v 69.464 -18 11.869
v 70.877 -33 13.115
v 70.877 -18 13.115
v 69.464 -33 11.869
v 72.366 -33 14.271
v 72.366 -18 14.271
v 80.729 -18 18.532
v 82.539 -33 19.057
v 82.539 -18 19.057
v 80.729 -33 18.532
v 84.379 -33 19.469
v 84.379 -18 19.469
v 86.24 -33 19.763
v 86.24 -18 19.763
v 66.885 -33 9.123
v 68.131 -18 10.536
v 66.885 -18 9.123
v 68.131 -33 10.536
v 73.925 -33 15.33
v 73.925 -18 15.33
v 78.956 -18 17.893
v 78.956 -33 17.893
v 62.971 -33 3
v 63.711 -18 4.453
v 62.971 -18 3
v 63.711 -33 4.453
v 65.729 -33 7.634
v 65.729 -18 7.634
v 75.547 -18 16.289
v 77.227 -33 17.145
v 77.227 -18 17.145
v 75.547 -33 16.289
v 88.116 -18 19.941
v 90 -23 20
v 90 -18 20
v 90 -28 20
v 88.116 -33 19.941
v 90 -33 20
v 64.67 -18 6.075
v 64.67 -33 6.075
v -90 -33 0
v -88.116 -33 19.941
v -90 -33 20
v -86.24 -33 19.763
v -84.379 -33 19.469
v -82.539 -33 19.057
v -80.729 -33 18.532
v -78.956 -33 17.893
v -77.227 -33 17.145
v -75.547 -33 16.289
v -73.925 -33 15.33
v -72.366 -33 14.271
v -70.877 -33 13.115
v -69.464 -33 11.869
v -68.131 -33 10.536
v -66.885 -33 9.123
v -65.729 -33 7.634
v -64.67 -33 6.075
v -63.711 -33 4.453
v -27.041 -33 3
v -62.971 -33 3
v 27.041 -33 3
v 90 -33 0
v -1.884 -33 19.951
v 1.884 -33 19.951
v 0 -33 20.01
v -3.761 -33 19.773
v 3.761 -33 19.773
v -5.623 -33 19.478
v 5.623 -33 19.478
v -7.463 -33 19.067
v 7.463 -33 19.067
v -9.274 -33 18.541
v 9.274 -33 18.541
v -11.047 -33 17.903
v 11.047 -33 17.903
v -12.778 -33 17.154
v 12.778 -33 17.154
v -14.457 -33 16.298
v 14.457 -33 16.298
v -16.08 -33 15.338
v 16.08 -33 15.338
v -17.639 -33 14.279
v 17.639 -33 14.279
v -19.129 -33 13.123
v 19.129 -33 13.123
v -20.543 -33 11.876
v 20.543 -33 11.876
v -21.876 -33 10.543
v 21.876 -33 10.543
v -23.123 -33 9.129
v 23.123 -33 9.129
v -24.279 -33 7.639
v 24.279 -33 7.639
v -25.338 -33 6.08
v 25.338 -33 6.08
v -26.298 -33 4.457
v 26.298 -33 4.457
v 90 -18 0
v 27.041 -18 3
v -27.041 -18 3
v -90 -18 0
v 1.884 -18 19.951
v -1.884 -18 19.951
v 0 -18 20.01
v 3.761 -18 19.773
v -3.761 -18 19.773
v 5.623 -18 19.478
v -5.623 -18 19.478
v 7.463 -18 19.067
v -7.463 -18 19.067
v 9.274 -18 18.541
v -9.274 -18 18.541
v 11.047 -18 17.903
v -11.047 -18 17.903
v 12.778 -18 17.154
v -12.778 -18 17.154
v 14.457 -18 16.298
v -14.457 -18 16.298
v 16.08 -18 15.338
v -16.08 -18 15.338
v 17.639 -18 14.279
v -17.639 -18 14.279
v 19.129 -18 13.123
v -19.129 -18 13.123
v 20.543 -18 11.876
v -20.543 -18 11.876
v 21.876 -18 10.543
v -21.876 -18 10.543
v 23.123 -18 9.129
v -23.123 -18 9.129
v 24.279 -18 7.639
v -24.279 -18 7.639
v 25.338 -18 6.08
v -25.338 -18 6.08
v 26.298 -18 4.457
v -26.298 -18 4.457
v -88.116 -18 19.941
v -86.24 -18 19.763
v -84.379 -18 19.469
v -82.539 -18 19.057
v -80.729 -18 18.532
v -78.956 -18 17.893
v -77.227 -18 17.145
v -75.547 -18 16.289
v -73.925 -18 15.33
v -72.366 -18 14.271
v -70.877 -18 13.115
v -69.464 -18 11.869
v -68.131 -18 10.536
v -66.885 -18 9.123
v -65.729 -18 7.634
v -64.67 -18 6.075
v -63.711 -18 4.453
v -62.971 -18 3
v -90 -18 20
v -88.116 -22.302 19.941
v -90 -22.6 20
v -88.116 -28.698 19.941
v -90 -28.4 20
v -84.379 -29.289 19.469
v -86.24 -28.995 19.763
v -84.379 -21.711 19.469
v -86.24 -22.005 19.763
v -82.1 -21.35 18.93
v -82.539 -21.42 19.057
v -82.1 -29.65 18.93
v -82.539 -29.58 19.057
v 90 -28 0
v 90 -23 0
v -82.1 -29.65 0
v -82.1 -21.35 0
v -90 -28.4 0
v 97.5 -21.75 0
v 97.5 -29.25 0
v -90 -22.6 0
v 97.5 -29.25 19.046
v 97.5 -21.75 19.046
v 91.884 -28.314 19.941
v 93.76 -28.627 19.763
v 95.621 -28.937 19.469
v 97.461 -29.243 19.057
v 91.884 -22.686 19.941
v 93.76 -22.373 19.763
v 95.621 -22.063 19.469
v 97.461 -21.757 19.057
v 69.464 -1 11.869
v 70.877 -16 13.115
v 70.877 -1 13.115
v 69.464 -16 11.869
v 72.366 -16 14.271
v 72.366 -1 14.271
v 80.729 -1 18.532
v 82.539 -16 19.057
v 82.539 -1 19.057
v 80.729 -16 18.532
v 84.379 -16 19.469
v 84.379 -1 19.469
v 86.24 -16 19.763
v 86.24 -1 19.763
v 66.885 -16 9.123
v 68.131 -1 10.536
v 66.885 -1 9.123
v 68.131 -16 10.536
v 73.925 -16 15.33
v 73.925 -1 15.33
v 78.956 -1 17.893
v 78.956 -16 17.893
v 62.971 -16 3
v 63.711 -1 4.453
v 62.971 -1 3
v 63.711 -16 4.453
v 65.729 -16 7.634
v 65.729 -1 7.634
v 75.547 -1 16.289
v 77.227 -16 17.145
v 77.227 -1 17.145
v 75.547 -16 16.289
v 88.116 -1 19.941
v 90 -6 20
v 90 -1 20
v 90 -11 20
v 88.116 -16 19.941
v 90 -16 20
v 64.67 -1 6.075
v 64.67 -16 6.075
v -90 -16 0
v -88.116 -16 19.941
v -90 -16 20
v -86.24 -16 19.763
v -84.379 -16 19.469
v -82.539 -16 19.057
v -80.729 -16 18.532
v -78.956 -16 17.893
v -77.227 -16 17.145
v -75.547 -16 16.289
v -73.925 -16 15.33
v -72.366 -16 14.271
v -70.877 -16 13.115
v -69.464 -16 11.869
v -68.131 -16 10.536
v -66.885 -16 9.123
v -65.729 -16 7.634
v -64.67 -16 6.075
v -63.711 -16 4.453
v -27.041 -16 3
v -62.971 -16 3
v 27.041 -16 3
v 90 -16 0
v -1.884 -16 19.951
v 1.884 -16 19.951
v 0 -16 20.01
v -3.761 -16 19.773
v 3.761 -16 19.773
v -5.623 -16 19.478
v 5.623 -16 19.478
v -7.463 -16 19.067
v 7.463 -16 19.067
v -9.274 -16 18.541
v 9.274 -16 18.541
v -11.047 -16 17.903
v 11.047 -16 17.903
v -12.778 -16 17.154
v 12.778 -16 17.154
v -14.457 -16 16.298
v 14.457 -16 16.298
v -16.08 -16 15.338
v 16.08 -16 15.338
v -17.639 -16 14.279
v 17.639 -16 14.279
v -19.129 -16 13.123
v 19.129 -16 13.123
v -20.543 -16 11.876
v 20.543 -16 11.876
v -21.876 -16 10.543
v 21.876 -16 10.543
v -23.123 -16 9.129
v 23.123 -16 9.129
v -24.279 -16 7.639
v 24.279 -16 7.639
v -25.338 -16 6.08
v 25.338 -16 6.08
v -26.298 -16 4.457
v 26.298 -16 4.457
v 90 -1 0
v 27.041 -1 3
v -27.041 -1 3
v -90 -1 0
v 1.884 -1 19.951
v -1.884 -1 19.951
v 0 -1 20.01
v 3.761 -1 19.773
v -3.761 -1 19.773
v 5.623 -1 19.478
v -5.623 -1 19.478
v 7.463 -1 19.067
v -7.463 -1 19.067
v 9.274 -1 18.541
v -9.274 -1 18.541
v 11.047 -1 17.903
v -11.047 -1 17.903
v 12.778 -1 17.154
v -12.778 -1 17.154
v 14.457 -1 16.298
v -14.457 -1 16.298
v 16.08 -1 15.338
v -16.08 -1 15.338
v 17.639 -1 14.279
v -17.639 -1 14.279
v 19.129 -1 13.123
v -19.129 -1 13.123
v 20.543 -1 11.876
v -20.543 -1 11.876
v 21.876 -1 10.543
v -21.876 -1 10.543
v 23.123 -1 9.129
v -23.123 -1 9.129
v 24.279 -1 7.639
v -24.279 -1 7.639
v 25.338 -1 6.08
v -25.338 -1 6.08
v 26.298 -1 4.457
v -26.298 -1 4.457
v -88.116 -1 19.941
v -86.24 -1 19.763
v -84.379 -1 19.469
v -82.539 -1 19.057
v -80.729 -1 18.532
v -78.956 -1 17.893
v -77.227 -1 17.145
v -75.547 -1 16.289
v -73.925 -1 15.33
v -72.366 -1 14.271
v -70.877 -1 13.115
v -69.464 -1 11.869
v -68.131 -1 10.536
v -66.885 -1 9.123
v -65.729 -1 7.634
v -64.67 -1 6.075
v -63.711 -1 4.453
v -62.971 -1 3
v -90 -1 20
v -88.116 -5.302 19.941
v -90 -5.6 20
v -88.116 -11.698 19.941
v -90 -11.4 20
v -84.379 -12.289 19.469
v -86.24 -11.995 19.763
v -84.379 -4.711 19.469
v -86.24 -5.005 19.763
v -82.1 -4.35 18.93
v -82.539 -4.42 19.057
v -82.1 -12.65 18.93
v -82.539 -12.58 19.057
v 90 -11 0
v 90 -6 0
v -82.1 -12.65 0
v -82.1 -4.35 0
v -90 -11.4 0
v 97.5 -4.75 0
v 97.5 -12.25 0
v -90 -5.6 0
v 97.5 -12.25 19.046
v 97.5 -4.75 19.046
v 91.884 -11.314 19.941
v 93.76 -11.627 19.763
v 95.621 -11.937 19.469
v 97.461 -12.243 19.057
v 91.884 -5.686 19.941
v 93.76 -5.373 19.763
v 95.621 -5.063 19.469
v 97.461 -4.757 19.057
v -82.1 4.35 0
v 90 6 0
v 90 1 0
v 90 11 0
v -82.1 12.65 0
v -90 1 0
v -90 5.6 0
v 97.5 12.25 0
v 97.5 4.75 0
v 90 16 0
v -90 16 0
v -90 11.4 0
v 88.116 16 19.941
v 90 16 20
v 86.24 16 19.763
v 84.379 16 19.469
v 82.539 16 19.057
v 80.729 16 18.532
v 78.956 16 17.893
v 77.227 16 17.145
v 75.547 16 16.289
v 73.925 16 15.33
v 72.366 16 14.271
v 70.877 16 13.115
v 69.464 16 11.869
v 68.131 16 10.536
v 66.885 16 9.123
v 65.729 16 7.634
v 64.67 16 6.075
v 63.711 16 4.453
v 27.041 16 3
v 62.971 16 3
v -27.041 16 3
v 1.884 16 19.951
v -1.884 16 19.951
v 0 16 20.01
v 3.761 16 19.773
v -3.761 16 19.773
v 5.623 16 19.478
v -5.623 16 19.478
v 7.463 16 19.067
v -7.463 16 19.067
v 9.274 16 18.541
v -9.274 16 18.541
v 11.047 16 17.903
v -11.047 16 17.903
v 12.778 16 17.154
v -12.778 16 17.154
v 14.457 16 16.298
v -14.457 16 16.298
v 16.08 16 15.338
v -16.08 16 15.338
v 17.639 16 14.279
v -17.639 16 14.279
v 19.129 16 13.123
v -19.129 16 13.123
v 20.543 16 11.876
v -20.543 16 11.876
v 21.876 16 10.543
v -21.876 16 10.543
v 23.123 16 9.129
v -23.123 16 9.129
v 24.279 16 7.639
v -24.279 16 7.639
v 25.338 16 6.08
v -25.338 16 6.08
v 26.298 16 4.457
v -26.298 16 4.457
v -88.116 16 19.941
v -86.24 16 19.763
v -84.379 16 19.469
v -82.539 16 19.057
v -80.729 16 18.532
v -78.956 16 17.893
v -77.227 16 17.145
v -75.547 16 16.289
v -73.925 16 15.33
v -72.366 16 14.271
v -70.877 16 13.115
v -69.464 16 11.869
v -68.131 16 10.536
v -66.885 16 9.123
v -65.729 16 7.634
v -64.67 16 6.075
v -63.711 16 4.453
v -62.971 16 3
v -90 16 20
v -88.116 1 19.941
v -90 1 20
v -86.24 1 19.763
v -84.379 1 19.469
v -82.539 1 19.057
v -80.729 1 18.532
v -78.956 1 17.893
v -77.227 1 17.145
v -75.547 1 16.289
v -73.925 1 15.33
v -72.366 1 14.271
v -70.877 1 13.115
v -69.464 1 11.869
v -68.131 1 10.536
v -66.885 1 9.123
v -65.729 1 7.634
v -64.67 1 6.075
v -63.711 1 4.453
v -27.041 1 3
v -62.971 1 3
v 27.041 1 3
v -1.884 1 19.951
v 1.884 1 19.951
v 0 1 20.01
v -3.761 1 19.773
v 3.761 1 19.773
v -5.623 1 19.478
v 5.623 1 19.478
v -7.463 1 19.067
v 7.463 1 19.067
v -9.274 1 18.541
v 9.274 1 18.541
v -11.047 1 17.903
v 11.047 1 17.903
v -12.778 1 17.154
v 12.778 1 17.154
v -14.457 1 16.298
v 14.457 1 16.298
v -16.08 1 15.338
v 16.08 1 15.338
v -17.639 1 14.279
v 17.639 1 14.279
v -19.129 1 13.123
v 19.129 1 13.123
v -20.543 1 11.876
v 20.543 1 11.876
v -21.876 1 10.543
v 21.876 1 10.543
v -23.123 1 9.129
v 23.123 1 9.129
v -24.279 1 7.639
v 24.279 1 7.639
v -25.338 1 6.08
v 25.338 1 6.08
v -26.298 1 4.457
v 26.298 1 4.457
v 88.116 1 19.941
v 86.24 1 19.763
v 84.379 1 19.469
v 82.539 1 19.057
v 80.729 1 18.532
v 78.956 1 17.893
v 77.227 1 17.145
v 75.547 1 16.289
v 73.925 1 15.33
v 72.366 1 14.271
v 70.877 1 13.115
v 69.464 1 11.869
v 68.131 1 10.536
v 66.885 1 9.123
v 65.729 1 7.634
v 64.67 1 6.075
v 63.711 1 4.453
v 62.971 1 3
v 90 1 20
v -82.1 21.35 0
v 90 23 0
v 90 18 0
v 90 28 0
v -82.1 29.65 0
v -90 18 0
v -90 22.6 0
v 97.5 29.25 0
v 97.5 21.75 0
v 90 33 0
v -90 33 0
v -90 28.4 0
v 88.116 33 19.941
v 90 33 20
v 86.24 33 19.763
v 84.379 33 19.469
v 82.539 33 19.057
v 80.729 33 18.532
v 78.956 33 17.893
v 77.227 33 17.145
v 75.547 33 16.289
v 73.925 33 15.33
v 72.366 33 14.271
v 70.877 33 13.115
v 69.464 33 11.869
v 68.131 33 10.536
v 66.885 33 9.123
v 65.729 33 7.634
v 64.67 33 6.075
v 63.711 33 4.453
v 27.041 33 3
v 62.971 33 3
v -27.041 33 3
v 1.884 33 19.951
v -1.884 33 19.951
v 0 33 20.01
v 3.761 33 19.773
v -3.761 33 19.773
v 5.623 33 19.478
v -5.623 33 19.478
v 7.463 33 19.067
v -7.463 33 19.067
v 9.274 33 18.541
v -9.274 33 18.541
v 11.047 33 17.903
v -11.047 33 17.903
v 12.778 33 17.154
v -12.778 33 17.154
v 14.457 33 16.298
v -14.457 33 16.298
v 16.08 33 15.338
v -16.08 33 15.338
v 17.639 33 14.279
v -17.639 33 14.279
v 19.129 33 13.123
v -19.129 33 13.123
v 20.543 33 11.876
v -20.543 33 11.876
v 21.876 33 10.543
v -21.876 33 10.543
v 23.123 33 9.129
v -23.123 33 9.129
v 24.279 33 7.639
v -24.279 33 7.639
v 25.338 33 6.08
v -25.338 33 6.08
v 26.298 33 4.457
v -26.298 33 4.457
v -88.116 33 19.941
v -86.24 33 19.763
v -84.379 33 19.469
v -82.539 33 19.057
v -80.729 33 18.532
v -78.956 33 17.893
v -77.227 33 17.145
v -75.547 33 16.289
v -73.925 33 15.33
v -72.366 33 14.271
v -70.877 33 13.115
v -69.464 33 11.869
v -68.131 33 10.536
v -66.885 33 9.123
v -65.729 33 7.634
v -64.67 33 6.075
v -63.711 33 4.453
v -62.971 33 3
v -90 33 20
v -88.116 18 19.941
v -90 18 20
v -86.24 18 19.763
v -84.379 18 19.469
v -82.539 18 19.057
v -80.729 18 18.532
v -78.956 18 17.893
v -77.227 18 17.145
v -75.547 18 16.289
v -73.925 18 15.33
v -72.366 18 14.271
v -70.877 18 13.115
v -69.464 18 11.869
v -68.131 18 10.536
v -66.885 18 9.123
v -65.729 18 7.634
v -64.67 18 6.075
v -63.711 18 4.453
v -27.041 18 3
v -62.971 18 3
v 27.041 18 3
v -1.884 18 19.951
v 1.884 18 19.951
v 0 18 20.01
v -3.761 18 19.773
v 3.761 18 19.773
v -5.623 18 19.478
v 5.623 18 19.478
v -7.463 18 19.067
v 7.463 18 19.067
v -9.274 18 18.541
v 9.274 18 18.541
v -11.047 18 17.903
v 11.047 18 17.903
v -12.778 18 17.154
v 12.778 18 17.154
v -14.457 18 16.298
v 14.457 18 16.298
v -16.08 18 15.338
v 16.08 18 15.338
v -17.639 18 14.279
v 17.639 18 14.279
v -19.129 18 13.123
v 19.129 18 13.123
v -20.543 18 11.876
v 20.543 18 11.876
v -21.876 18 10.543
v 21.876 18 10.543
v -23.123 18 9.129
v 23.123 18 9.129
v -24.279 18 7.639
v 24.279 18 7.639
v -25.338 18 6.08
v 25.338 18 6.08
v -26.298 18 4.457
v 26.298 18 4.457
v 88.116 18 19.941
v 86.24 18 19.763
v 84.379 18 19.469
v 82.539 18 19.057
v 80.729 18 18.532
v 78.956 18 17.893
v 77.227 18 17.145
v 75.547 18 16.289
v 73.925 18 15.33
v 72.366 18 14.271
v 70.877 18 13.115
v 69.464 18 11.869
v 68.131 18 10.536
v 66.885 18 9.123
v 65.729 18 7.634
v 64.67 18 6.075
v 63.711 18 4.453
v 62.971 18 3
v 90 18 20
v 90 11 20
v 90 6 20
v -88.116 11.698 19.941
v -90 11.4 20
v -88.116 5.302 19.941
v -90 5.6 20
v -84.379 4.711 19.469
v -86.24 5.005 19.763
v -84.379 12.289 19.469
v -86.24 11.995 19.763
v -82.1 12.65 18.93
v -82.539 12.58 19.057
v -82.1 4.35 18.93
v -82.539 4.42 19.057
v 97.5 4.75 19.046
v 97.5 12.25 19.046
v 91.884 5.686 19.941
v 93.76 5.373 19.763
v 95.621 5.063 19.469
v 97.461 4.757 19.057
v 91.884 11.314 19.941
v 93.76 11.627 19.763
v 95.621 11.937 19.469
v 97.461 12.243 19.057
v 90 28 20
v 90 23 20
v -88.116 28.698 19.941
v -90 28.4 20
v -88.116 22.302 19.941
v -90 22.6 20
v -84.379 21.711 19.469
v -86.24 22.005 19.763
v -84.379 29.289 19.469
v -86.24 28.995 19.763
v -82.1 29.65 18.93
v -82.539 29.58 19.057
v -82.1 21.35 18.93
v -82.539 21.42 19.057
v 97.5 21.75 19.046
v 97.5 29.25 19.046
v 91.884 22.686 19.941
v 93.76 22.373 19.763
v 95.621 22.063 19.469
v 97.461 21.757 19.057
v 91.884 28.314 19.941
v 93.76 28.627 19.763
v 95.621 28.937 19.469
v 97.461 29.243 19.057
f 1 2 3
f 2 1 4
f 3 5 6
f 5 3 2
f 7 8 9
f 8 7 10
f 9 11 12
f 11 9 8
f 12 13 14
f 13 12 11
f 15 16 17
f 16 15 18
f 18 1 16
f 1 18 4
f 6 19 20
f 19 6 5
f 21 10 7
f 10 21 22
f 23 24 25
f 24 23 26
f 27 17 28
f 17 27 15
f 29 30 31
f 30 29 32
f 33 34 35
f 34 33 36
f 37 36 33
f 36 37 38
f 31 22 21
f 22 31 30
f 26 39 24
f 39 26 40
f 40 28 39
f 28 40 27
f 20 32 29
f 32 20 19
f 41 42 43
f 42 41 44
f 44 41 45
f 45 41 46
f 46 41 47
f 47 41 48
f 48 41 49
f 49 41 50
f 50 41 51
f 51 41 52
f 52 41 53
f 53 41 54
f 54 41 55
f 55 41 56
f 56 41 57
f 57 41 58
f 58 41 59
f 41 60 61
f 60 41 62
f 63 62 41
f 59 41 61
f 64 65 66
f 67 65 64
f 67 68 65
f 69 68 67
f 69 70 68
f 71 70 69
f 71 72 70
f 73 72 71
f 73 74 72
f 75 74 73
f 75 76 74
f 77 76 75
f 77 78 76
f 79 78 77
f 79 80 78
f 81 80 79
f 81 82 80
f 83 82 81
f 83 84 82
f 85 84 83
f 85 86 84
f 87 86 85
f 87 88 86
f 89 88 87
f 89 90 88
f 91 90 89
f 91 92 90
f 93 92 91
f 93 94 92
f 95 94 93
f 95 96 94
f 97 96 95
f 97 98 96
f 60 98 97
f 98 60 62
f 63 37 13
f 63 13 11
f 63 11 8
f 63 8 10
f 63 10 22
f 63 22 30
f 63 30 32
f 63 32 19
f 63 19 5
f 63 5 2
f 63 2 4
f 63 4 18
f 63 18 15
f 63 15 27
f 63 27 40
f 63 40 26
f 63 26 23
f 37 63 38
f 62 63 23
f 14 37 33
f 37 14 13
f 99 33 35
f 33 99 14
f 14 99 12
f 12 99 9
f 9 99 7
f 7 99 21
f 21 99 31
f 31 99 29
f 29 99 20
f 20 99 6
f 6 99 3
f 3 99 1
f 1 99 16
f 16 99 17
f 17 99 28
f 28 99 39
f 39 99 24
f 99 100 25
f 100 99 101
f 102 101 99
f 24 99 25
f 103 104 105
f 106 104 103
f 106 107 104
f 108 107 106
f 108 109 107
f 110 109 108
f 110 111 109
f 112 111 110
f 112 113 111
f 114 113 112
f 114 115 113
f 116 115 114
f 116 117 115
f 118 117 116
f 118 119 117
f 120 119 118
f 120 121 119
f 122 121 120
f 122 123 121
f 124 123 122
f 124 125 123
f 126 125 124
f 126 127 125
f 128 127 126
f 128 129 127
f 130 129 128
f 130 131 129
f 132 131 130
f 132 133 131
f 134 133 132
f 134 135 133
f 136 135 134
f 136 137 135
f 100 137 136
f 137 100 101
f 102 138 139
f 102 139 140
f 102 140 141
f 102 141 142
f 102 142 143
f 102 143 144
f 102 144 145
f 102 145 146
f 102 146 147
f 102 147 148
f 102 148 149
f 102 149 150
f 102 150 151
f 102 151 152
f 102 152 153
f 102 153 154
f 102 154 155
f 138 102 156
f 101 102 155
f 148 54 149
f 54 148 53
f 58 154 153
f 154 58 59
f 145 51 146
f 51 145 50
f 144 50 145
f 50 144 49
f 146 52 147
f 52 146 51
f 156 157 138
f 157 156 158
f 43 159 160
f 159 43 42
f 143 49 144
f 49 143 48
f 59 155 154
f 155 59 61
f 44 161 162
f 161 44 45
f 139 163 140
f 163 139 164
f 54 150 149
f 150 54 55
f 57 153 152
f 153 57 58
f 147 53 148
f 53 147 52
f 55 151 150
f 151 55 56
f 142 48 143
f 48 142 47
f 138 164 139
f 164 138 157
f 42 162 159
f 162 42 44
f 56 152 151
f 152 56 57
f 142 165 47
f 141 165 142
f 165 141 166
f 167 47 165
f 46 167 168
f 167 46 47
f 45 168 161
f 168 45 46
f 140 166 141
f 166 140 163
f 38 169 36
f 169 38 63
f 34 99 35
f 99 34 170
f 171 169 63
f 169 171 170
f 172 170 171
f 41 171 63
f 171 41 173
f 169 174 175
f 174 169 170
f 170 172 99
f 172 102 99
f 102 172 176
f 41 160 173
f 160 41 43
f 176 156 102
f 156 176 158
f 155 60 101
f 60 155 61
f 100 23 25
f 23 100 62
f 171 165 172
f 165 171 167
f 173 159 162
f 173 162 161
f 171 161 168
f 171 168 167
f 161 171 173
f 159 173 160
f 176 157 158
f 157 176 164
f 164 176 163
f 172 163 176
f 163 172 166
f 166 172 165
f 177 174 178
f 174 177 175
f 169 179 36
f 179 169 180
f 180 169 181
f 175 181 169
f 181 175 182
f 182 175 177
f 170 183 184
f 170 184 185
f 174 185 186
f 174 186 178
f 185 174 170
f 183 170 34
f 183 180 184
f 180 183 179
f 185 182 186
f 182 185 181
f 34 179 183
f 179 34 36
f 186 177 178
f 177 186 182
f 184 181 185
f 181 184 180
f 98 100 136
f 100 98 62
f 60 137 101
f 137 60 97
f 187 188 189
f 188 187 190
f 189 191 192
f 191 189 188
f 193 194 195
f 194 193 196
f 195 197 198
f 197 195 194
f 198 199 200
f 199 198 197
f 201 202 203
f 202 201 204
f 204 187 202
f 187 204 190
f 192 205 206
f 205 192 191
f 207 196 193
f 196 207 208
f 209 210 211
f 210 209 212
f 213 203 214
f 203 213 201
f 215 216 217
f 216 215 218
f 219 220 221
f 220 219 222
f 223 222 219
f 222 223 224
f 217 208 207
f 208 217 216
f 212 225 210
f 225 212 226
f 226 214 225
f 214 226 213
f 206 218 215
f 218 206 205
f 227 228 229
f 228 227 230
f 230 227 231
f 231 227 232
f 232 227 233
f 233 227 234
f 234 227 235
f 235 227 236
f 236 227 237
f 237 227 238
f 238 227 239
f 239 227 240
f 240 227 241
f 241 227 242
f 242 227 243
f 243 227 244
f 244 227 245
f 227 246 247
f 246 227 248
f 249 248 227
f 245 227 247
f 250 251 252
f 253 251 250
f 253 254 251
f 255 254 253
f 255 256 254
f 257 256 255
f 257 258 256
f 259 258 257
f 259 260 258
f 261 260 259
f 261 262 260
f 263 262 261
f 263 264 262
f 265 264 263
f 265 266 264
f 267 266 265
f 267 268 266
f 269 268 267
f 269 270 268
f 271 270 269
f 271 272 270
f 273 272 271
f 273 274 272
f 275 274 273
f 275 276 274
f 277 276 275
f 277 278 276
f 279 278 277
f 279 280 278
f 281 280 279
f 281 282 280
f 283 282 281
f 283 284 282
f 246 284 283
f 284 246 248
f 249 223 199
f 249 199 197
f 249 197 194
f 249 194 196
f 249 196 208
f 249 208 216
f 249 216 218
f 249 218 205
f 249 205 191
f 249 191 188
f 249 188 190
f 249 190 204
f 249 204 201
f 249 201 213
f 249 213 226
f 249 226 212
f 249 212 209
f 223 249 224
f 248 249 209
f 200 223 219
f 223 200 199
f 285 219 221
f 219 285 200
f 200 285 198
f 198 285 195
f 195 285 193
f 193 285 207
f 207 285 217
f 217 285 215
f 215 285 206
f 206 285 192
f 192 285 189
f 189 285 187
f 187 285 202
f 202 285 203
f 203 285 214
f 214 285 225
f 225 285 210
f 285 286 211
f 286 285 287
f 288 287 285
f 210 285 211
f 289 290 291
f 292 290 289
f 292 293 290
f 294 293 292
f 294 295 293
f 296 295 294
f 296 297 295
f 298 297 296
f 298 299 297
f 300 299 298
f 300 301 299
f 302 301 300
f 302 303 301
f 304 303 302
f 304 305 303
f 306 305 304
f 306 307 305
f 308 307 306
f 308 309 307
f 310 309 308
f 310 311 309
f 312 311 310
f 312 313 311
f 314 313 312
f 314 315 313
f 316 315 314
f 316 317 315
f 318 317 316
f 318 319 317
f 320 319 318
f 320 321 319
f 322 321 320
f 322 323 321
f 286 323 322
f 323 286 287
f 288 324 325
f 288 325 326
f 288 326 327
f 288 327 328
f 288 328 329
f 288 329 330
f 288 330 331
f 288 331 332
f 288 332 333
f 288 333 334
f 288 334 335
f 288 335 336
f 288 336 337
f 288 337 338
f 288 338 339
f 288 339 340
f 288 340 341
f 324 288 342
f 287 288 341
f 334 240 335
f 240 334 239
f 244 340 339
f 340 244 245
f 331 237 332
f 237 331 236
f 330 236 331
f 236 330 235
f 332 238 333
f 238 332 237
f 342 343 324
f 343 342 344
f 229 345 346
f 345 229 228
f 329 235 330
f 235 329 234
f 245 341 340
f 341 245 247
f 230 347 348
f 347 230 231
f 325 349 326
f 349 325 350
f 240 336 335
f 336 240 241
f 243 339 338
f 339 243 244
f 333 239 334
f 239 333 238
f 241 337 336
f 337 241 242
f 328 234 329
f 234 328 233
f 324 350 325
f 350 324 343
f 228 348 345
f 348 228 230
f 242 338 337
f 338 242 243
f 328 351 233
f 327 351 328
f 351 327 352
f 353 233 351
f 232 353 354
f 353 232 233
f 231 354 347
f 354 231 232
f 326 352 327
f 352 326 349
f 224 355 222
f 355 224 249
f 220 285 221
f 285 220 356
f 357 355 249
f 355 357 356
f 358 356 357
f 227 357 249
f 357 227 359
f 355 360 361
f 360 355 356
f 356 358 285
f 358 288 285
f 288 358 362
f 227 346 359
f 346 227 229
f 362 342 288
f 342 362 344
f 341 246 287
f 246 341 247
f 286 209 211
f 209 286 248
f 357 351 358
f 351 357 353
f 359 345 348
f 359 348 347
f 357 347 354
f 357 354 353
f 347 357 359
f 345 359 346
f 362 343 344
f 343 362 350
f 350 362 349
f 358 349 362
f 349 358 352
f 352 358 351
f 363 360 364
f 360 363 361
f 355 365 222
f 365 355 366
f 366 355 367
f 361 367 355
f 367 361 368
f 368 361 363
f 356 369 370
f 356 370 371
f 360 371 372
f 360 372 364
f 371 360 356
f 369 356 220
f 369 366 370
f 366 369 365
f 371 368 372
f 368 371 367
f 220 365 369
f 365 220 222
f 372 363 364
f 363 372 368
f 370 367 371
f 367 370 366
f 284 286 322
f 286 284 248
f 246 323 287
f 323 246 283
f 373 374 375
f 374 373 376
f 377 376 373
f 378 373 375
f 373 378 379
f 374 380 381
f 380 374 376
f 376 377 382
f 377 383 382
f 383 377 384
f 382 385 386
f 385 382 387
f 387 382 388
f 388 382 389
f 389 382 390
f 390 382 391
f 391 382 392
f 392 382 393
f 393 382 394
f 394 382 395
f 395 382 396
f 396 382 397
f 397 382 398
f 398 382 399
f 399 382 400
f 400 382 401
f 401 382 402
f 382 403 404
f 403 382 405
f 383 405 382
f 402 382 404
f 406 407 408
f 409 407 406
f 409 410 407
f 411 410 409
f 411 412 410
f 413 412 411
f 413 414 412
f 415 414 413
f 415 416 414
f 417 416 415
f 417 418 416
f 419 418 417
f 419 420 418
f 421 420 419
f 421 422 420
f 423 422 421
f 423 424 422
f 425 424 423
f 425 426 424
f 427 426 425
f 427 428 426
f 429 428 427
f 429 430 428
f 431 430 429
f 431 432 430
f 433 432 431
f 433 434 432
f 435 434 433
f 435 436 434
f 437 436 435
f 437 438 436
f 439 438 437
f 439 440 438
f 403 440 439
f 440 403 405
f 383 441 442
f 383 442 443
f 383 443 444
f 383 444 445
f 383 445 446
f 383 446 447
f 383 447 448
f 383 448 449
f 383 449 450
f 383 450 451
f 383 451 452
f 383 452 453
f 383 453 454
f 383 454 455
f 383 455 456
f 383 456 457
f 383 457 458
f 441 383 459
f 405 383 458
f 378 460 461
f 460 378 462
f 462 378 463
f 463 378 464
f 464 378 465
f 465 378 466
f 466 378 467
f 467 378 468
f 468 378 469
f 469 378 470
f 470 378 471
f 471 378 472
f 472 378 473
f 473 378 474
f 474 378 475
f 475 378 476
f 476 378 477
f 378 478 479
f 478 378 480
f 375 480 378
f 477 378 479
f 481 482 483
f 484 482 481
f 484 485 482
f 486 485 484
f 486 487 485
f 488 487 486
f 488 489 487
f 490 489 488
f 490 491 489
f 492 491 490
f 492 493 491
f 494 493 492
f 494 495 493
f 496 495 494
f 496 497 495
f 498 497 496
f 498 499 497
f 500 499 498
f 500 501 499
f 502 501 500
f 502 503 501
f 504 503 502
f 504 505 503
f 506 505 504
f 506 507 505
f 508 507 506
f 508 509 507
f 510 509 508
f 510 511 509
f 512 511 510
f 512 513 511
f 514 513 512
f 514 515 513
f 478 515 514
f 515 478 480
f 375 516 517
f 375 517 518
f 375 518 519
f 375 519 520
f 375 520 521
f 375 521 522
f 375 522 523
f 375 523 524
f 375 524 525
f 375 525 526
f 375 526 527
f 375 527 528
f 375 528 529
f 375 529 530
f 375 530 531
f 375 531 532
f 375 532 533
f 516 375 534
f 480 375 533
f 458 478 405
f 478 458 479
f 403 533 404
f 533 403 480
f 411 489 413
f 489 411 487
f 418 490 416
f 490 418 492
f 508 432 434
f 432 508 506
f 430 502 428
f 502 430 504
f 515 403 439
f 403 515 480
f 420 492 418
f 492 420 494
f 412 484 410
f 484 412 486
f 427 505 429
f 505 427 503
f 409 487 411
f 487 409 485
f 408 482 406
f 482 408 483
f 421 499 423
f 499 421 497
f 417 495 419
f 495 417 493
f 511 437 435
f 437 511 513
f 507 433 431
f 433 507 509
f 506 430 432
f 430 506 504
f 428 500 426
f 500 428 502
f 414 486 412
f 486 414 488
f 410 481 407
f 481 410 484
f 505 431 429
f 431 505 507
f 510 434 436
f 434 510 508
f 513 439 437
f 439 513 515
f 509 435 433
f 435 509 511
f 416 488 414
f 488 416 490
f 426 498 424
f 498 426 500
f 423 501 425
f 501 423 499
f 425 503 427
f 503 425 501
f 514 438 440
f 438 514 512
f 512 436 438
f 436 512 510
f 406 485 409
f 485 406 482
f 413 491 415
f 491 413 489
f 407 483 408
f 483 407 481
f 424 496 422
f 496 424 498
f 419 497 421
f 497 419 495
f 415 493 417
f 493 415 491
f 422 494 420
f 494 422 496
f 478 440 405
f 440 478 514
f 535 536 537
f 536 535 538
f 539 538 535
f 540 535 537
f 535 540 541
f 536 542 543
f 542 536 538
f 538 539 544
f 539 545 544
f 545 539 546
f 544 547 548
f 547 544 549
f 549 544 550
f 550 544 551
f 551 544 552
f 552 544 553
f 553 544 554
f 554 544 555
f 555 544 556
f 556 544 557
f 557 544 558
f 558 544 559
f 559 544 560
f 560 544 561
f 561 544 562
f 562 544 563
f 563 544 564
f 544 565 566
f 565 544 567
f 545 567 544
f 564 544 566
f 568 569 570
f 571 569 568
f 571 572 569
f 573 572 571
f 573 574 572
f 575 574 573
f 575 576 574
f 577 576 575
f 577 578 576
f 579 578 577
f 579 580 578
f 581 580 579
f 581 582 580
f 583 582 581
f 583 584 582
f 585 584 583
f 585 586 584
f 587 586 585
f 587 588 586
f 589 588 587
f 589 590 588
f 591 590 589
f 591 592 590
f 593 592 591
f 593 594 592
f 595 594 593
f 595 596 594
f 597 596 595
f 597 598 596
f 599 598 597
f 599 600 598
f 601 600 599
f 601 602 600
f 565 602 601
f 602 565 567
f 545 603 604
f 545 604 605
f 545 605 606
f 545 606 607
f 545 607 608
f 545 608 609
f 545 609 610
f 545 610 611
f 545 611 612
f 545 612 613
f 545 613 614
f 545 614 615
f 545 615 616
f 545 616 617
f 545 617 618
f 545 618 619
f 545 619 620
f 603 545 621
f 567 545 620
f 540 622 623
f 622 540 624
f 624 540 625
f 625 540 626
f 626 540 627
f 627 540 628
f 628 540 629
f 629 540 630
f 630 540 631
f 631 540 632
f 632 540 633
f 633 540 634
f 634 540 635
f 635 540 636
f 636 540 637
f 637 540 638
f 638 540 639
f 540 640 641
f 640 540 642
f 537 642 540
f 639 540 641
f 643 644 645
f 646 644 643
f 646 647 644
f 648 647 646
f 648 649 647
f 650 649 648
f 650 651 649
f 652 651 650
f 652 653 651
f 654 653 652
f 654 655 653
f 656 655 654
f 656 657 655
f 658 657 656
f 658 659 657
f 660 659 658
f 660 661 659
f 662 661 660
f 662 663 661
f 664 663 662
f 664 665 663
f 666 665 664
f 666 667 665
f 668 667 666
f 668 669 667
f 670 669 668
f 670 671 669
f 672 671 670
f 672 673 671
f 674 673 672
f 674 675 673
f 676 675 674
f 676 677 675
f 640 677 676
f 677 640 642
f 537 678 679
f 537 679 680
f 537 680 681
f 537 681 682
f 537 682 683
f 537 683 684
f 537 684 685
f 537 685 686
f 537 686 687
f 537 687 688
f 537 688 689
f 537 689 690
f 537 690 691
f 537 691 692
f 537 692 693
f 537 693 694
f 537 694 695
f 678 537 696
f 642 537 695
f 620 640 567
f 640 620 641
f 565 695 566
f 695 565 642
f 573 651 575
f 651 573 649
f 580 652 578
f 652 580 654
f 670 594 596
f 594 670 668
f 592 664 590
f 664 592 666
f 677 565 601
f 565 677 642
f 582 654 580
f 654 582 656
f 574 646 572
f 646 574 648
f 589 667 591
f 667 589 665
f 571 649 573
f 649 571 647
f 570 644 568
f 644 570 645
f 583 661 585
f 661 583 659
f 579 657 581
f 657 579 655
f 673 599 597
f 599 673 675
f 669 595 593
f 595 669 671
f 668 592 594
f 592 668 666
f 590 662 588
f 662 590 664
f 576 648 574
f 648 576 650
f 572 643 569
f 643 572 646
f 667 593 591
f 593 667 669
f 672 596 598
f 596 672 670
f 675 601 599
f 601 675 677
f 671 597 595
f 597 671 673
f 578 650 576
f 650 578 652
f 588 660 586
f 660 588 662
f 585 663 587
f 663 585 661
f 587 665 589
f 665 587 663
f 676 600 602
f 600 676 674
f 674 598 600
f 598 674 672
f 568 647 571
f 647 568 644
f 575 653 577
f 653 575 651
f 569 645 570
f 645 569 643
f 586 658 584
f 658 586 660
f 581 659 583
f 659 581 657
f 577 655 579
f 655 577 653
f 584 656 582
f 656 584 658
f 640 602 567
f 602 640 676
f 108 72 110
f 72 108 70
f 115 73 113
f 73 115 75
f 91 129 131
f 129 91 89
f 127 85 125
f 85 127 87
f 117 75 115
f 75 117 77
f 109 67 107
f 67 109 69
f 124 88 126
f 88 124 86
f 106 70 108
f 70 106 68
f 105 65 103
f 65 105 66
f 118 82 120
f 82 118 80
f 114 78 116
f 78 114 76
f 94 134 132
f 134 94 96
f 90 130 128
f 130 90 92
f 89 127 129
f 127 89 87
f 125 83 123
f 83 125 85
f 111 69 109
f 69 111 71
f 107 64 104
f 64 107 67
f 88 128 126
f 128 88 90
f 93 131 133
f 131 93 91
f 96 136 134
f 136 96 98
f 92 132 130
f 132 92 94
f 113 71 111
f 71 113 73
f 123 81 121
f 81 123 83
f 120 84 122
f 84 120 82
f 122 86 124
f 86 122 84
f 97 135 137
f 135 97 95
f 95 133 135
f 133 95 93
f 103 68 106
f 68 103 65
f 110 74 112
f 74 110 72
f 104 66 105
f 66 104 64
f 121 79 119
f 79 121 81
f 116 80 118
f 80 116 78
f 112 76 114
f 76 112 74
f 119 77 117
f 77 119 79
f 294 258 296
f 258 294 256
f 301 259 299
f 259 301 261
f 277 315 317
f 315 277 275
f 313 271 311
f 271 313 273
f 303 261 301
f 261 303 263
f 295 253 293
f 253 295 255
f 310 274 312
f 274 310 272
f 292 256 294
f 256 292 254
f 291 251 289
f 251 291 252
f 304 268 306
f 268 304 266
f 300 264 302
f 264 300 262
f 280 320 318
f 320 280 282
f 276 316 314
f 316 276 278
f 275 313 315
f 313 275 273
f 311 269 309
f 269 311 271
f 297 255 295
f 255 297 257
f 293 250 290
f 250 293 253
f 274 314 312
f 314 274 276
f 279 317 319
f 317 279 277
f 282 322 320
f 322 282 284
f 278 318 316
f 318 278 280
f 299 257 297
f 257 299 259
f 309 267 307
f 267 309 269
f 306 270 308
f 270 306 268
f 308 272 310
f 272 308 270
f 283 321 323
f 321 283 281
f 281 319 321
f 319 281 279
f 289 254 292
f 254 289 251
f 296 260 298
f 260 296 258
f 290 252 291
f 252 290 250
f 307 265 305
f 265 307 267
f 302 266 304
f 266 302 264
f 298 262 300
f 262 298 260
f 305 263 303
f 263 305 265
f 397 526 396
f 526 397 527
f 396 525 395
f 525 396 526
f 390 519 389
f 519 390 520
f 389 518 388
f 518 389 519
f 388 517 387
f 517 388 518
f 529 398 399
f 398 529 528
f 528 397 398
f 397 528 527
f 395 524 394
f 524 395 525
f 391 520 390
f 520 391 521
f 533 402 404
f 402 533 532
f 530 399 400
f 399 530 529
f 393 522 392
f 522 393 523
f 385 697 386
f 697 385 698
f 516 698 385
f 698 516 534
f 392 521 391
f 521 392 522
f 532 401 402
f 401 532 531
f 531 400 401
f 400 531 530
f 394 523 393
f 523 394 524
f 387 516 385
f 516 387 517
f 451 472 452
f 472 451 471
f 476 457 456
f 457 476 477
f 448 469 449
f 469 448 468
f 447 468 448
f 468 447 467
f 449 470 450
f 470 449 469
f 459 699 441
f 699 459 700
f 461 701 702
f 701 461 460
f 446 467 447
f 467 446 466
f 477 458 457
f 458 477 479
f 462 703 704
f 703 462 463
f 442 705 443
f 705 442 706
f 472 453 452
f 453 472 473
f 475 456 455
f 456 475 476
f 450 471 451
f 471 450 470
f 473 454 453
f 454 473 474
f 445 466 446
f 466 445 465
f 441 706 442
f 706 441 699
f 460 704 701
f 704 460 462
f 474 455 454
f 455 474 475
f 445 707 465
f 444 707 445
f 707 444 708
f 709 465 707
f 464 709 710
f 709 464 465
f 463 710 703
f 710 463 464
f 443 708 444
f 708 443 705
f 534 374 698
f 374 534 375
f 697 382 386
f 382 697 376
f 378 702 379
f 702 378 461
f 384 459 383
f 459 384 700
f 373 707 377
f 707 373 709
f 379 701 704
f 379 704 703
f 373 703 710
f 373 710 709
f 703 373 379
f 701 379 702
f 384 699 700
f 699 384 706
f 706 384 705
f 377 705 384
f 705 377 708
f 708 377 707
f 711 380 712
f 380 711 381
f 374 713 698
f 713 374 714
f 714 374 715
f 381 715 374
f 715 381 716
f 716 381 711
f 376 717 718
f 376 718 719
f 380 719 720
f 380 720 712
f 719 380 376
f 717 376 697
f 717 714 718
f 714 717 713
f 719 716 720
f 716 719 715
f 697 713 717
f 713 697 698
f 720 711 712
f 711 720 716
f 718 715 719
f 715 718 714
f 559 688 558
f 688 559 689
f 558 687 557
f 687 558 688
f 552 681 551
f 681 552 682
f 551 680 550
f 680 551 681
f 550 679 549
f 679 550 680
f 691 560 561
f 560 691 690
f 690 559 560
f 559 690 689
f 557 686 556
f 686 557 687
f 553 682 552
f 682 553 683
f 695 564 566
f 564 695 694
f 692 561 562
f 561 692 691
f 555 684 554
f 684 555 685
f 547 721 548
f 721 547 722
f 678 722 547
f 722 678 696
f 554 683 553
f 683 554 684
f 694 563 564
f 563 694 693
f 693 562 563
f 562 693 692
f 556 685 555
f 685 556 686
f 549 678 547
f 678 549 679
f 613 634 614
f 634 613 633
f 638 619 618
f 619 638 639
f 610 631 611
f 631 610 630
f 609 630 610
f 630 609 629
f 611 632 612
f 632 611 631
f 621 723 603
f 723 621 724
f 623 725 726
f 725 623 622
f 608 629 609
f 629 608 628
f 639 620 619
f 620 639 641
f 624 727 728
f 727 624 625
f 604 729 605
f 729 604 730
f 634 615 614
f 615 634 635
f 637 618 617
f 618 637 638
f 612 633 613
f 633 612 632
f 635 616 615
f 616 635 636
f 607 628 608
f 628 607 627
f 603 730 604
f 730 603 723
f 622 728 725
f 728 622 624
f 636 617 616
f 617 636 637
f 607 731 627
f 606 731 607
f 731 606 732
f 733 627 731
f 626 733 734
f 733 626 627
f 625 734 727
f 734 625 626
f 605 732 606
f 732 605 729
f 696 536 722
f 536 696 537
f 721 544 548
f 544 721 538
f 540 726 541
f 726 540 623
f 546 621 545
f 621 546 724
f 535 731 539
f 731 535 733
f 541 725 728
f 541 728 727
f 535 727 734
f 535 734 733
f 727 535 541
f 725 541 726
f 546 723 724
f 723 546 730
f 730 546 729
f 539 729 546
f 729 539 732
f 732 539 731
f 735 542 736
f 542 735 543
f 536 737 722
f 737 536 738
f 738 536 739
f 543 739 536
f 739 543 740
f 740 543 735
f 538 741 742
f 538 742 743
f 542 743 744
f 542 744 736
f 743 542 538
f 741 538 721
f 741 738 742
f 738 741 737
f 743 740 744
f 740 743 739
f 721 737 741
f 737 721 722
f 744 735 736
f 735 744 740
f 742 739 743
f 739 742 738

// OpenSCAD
//*********User Defined variables****************

//How many pairs of strips do you want to print?
pairs=2;

//What's the primary color?
primary_color="white"; //[black,silver,gray,white,maroon,red,purple,fuchsia,green,lime,olive,yellow,navy,blue,teal,aqua]

//What's the secondary color?
secondary_color="red"; //[black,silver,gray,white,maroon,red,purple,fuchsia,green,lime,olive,yellow,navy,blue,teal,aqua]

//This design will output 3 files - one for printing in a solid color and 2 for printing using dualstrusion.
part = "Solid"; //[Solid,Dual1,Dual2]

//If you're dualstruding, do you want all strips the same or do you want half with the colors reversed?
dualstrusion_mix = "mixed"; //[all the same,mixed]

//About how wide should each bottle space be? 90mm works well for wine bottles.
bottle_space_width=90;

//How deep should the strips be?  15 mm works well for wine bottles.
strip_depth=15;

//How thick should the strips be?
strip_thickness=3;

//How far apart do you want the strips spaced on the build platform?
spacing = 2;

//What tolerance should be used for the dovetail joints?
tolerance=.4;


//*****Dimensional Parameters*****
//*****These are currently set for standard wine bottles****
length = bottle_space_width; //This is really half the overall length, so final length = length*2
depth = strip_depth; //depth of the strip
base_thick = strip_thickness; //thickness of the base
bump = 1/3*bottle_space_width; // radius of the circles that form the bumps in the strip
clearance = 2/3*bump; //height above the base that the bumps will protrude
res=100*1; //resolution for rendering of circles
tol=tolerance;


//**********Calculated Variables*****
count=pairs*2;


//**********Generate parts***********


//*******first color**********//
if(part=="Dual1" || part=="Solid")color(primary_color){
	//***********all parts dualstruded*******//
	if(dualstrusion_mix=="all the same"){
		for(i=[0:count-1]){
			translate([0,(-(count-1)*(depth+spacing))/2+i*(depth+spacing),0]){
				difference(){
					strip();
					center_void();
				}
			}
		}
	}
	//***********half parts dualstruded normally, half colors reversed*****//
	if(dualstrusion_mix=="mixed"){
		for(i=[0:pairs-1]){
			translate([0,(-(count-1)*(depth+spacing))/2+i*(depth+spacing),0]){
				difference(){
					strip();
					center_void();
				}
			}
		}
		for(i=[pairs:count-1]){
			translate([0,(-(count-1)*(depth+spacing))/2+i*(depth+spacing),0]){
				center();
			}
		}
	}
}

//////////*********Second color for dualstrusion*****
if(part=="Dual2" || part=="Solid")color(secondary_color){
	//***********all parts dualstruded*******//
	if(dualstrusion_mix=="all the same"){
		for(i=[0:count-1]){
			translate([0,(-(count-1)*(depth+spacing))/2+i*(depth+spacing),0]){
				center();
			}
		}
	}
	//***********half parts dualstruded normally, half colors reversed*****//
	if(dualstrusion_mix=="mixed"){
		for(i=[0:pairs-1]){
			translate([0,(-(count-1)*(depth+spacing))/2+i*(depth+spacing),0]){
				center();
			}
		}
		for(i=[pairs:count-1]){
			translate([0,(-(count-1)*(depth+spacing))/2+i*(depth+spacing),0]){
				difference(){
					strip();
					center_void();
				}
			}
		}
	}
}



//**********************************************
/////////////////Define main component//////////
//**********************************************

module strip(){

	difference(){
	
	union(){
	
		translate([0,0,base_thick/2])cube([2*length,depth,base_thick], center=true);
		
			intersection(){
			
				union(){
					translate([length,0,-bump+clearance])rotate([90,0,0])cylinder(h=depth,r=bump,center=true,$fn=res);
					translate([0,0,-bump+clearance])rotate([90,0,0])cylinder(h=depth,r=bump,center=true,$fn=res);
					translate([-length,0,-bump+clearance])rotate([90,0,0])cylinder(h=depth,r=bump,center=true,$fn=res);
				}
			
				translate([0,0,bump])cube([2*length,depth,2*bump],center=true);
		}
	}
	
	translate([-length,0,0])linear_extrude(height = bump)polygon([[0,1/6*depth+tol],[1/2*depth+tol,1/4*depth+tol],[1/2*depth+tol,-1/4*depth-tol],[0,-1/6*depth-tol]],[[0,1,2,3]]);
	
	}
	
	
	
	intersection(){
		translate([length,0,0])linear_extrude(height = bump)polygon([[0,1/6*depth],[1/2*depth,1/4*depth],[1/2*depth,-1/4*depth],[0,-1/6*depth]],[[0,1,2,3]]);
		translate([length,0,-bump+clearance])rotate([90,0,0])cylinder(h=depth,r=bump,center=true,$fn=res);
	}
}




//**************************************************************************
/////////////////Define void on main piece for dualstrusion//////////
////////////////Slightly thicker than center piece to eliminate "plane" of polygons////
//**************************************************************************

module center_void(){
		
	intersection(){

		translate([0,0,-bump+clearance])rotate([90,0,0])cylinder(h=depth+spacing/4,r=bump+.01,center=true,$fn=res);
	
		difference(){
			translate([0,0,0])cube([2*length,depth+spacing/4,2*bump],center=true);
			translate([0,0,0])cube([2*length,depth/3,2*base_thick],center=true);
		}
	}
}




//**************************************************************************
/////////////////Define second color center piece for dualstrusion//////////
//**************************************************************************

module center(){
		
	intersection(){

		translate([0,0,-bump+clearance])rotate([90,0,0])cylinder(h=depth,r=bump+.01,center=true,$fn=res);
	
		difference(){
			translate([0,0,bump])cube([2*length,depth,2*bump],center=true);
			translate([0,0,base_thick/2])cube([2*length,depth/3,base_thick],center=true);
		}
	}
}
